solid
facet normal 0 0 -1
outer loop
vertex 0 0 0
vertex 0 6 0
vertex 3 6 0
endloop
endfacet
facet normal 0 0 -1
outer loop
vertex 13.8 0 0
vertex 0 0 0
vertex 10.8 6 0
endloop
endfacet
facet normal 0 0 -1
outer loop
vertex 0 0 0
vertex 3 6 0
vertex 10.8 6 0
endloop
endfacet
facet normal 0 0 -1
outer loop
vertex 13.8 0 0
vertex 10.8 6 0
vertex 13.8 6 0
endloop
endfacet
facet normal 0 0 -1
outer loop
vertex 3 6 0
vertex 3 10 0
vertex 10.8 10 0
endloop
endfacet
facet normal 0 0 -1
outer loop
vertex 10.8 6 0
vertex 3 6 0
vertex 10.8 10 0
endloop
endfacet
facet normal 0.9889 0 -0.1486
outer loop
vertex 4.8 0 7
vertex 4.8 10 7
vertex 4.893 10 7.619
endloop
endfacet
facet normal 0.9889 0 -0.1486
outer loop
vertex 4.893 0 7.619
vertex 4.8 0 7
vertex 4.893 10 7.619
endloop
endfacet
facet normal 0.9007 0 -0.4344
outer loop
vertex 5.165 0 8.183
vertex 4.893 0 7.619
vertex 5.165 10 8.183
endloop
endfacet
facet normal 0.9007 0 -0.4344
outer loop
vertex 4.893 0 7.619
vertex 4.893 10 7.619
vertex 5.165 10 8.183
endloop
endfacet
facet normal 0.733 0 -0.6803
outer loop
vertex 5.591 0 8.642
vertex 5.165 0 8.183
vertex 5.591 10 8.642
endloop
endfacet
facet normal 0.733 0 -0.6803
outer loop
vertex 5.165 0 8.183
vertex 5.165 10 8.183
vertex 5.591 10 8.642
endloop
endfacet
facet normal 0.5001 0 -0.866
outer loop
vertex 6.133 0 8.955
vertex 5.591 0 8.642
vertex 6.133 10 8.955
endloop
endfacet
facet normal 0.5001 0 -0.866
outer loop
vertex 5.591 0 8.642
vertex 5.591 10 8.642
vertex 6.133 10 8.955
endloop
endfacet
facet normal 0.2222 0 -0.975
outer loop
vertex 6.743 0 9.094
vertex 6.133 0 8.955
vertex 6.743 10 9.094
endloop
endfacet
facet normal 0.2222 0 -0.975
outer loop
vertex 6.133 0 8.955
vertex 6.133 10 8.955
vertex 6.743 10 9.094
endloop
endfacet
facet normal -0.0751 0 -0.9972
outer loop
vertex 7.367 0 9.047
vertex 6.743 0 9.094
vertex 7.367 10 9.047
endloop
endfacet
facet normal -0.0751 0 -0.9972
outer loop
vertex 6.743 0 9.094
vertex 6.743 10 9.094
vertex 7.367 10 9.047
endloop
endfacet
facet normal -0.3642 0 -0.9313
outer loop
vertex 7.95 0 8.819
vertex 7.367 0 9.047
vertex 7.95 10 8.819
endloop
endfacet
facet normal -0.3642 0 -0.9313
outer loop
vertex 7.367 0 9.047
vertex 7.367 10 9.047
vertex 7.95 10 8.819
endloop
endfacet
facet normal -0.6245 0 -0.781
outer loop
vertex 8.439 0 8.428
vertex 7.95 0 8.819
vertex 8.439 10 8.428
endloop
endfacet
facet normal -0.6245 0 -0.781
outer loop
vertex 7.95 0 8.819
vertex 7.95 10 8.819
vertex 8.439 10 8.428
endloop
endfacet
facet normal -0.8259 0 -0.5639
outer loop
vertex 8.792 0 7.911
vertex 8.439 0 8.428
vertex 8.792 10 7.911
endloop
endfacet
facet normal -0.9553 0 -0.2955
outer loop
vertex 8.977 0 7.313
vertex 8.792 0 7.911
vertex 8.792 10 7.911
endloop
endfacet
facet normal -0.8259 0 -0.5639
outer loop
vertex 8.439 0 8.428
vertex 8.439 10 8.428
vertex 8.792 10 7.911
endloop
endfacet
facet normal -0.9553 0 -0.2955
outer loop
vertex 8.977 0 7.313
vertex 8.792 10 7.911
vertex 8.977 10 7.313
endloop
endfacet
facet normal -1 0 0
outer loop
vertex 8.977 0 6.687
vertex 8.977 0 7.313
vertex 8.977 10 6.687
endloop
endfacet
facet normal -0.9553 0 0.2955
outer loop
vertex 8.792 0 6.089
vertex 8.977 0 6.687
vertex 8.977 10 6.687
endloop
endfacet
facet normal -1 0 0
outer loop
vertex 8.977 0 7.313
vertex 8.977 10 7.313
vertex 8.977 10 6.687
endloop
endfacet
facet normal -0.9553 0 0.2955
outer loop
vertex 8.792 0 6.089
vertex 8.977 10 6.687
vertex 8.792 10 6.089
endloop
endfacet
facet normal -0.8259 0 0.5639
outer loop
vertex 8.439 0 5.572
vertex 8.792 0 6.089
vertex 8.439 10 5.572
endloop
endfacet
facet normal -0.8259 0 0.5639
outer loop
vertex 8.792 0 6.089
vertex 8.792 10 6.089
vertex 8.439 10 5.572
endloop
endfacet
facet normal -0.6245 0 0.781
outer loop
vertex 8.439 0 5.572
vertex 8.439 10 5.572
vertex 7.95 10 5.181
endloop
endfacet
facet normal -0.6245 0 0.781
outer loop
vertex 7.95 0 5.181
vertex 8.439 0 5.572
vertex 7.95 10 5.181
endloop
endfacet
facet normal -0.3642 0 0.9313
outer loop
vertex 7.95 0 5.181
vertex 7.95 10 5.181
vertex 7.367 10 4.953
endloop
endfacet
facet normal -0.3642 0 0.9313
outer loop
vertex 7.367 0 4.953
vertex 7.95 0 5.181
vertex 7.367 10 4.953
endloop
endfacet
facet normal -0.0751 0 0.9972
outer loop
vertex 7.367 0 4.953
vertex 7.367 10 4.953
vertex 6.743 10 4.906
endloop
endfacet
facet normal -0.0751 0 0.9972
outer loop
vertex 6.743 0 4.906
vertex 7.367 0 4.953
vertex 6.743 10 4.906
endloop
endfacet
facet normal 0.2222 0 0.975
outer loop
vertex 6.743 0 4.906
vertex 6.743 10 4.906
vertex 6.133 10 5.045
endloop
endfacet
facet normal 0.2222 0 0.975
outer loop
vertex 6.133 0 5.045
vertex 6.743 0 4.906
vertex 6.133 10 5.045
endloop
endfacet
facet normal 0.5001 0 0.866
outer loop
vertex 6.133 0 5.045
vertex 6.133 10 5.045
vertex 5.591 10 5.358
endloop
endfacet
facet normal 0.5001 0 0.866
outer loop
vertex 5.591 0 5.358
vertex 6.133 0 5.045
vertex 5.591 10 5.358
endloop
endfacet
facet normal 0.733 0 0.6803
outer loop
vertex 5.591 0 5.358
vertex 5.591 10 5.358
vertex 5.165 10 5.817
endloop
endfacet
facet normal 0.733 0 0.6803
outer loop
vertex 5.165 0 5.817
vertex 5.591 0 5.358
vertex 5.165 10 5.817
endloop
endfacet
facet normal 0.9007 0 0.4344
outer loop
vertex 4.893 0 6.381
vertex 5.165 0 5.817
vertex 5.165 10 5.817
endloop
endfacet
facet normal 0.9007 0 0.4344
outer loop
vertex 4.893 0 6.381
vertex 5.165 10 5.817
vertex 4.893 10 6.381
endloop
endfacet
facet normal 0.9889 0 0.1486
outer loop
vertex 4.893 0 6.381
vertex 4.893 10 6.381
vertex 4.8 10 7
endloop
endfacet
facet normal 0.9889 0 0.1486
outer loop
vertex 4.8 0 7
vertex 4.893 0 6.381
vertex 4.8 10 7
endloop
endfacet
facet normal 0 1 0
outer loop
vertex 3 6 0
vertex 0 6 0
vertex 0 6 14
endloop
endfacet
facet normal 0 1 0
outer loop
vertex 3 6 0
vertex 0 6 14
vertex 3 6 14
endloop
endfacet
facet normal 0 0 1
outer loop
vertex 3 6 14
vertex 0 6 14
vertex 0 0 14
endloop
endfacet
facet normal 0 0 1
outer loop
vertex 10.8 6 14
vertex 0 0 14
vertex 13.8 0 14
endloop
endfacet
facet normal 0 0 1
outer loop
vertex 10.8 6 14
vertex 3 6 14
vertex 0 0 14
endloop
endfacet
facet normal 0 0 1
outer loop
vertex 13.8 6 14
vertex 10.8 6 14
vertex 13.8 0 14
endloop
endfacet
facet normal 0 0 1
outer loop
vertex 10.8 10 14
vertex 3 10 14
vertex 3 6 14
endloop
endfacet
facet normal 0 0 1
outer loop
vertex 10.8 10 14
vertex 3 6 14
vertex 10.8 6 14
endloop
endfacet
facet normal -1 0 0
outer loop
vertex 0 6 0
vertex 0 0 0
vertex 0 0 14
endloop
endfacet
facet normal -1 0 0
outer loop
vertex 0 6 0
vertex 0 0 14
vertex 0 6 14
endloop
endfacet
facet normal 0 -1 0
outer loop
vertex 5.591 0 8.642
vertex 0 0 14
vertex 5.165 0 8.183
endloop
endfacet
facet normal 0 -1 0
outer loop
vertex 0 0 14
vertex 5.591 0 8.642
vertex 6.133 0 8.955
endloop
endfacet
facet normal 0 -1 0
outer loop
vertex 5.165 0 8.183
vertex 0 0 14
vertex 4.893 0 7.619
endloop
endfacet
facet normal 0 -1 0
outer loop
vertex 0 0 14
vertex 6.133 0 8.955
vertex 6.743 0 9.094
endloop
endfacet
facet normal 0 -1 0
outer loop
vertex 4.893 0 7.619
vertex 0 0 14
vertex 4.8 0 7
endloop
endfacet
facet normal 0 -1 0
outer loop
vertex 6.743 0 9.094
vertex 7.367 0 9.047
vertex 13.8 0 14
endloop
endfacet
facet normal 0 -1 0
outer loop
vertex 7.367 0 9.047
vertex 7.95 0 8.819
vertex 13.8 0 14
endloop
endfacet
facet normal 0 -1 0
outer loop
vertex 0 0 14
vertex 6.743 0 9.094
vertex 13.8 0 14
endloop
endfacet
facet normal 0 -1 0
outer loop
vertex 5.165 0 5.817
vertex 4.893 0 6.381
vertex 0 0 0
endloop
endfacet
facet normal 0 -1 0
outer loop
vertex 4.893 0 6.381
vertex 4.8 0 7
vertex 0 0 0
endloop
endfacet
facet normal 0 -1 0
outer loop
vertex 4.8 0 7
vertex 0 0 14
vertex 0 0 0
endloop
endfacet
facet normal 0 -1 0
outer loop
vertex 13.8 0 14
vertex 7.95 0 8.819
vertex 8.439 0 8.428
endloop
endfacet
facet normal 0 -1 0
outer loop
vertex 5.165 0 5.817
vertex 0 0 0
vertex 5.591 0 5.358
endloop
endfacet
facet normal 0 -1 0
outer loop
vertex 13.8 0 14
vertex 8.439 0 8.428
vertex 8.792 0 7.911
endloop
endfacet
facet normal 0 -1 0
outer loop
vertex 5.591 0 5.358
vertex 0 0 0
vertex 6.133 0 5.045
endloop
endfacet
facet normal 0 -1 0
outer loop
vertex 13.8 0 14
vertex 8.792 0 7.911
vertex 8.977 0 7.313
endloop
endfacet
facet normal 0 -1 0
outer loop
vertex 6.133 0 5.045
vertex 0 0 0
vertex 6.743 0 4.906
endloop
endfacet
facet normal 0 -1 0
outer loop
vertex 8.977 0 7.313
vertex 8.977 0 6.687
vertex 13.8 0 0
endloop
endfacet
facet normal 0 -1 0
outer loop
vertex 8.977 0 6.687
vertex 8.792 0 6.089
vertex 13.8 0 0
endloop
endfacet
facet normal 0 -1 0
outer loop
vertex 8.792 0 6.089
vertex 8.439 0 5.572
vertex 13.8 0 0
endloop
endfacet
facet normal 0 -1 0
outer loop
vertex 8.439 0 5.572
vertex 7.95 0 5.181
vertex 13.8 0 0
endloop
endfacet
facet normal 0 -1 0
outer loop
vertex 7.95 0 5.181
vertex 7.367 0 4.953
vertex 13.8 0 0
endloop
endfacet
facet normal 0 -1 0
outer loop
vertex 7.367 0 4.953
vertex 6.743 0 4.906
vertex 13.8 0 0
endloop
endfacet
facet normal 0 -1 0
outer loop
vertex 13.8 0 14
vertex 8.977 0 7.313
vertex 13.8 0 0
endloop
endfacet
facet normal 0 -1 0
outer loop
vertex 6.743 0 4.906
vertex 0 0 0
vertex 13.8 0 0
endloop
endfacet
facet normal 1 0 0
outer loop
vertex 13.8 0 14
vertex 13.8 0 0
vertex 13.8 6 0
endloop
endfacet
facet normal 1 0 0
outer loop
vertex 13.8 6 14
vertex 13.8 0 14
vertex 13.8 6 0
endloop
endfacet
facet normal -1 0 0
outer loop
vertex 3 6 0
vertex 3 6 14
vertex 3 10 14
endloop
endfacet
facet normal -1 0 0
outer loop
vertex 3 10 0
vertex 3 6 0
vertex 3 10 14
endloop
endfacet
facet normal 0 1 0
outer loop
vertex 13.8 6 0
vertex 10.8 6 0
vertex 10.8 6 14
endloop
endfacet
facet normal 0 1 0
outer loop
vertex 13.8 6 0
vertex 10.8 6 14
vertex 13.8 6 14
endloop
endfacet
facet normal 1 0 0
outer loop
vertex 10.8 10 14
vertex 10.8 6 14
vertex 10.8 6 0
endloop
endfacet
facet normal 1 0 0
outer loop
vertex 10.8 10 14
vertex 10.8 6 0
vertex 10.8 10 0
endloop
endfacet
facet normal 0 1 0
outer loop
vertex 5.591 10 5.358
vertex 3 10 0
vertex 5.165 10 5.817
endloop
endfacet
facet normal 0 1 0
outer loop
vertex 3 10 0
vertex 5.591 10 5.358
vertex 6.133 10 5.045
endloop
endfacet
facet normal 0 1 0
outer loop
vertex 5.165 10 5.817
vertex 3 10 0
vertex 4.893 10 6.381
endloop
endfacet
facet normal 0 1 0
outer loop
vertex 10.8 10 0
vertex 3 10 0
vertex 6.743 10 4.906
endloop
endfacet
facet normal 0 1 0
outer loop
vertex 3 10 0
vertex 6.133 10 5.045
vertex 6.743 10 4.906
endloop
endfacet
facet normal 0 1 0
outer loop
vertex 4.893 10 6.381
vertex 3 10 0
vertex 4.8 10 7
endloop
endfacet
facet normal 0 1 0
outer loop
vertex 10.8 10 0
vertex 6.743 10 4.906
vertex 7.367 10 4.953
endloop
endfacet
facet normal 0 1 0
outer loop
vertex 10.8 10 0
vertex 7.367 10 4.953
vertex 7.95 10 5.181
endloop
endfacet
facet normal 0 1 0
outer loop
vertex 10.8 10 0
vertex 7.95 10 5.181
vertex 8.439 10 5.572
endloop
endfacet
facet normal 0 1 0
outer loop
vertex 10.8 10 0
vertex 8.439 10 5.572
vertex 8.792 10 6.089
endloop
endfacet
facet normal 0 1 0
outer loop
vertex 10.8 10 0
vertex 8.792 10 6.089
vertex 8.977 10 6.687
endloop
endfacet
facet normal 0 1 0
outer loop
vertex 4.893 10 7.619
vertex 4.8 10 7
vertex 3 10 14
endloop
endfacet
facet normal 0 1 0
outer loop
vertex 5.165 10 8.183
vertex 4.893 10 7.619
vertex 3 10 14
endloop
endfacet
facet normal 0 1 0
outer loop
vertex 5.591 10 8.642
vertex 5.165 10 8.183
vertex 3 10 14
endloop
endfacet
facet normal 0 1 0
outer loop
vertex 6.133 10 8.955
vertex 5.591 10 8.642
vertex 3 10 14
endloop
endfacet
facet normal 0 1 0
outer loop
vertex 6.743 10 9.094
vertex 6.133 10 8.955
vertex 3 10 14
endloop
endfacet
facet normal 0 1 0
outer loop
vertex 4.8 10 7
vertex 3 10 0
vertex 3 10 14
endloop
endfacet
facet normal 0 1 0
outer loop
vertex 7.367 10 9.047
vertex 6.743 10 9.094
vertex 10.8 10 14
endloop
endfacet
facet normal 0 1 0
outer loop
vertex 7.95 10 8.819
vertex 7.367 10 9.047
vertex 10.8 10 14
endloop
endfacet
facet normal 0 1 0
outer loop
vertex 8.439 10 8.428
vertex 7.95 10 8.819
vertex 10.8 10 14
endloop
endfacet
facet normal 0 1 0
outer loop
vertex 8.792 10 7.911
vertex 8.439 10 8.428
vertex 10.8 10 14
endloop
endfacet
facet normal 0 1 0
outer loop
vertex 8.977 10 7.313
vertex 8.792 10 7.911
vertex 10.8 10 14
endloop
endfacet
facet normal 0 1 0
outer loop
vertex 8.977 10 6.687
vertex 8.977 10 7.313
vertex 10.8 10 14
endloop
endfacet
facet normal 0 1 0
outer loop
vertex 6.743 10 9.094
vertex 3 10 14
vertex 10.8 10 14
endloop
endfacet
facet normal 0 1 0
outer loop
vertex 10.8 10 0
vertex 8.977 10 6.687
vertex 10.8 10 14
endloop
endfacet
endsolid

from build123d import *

# Parameters (mm, degrees)
ESQUISSE1_W             = 13.8
ESQUISSE1_H             = 6
BOSS_EXTRU_1_DEPTH      = 14
ESQUISSE2_W             = 7.8
ESQUISSE2_H             = 4
BOSS_EXTRU_2_DEPTH      = 14
ESQUISSE3_R             = 2.1
ENL_V_MAT_EXTRU_1_DEPTH = 23.05538483


with BuildPart() as part:
    # Esquisse1 → Boss.-Extru.1 (new body)
    with BuildSketch(Plane.XY):
        with Locations((6.9, 3)):
            Rectangle(ESQUISSE1_W, ESQUISSE1_H)
    extrude(amount=BOSS_EXTRU_1_DEPTH)

    # Esquisse2 → Boss.-Extru.2 (add)
    with BuildSketch(Plane.XY.offset(14)):
        with Locations((6.9, 8)):
            Rectangle(ESQUISSE2_W, ESQUISSE2_H)
    extrude(amount=-BOSS_EXTRU_2_DEPTH)

    # Esquisse3 → Enlèv. mat.-Extru.1 (cut, through all)
    with BuildSketch(Plane(origin=(0, 10, 0), x_dir=(1, 0, 0), z_dir=(0, 1, 0))):
        with Locations(Location((6.9, -7, 0), (0, 0, 180))):
            Circle(ESQUISSE3_R)
    extrude(amount=-ENL_V_MAT_EXTRU_1_DEPTH, mode=Mode.SUBTRACT)


solid = part.part
